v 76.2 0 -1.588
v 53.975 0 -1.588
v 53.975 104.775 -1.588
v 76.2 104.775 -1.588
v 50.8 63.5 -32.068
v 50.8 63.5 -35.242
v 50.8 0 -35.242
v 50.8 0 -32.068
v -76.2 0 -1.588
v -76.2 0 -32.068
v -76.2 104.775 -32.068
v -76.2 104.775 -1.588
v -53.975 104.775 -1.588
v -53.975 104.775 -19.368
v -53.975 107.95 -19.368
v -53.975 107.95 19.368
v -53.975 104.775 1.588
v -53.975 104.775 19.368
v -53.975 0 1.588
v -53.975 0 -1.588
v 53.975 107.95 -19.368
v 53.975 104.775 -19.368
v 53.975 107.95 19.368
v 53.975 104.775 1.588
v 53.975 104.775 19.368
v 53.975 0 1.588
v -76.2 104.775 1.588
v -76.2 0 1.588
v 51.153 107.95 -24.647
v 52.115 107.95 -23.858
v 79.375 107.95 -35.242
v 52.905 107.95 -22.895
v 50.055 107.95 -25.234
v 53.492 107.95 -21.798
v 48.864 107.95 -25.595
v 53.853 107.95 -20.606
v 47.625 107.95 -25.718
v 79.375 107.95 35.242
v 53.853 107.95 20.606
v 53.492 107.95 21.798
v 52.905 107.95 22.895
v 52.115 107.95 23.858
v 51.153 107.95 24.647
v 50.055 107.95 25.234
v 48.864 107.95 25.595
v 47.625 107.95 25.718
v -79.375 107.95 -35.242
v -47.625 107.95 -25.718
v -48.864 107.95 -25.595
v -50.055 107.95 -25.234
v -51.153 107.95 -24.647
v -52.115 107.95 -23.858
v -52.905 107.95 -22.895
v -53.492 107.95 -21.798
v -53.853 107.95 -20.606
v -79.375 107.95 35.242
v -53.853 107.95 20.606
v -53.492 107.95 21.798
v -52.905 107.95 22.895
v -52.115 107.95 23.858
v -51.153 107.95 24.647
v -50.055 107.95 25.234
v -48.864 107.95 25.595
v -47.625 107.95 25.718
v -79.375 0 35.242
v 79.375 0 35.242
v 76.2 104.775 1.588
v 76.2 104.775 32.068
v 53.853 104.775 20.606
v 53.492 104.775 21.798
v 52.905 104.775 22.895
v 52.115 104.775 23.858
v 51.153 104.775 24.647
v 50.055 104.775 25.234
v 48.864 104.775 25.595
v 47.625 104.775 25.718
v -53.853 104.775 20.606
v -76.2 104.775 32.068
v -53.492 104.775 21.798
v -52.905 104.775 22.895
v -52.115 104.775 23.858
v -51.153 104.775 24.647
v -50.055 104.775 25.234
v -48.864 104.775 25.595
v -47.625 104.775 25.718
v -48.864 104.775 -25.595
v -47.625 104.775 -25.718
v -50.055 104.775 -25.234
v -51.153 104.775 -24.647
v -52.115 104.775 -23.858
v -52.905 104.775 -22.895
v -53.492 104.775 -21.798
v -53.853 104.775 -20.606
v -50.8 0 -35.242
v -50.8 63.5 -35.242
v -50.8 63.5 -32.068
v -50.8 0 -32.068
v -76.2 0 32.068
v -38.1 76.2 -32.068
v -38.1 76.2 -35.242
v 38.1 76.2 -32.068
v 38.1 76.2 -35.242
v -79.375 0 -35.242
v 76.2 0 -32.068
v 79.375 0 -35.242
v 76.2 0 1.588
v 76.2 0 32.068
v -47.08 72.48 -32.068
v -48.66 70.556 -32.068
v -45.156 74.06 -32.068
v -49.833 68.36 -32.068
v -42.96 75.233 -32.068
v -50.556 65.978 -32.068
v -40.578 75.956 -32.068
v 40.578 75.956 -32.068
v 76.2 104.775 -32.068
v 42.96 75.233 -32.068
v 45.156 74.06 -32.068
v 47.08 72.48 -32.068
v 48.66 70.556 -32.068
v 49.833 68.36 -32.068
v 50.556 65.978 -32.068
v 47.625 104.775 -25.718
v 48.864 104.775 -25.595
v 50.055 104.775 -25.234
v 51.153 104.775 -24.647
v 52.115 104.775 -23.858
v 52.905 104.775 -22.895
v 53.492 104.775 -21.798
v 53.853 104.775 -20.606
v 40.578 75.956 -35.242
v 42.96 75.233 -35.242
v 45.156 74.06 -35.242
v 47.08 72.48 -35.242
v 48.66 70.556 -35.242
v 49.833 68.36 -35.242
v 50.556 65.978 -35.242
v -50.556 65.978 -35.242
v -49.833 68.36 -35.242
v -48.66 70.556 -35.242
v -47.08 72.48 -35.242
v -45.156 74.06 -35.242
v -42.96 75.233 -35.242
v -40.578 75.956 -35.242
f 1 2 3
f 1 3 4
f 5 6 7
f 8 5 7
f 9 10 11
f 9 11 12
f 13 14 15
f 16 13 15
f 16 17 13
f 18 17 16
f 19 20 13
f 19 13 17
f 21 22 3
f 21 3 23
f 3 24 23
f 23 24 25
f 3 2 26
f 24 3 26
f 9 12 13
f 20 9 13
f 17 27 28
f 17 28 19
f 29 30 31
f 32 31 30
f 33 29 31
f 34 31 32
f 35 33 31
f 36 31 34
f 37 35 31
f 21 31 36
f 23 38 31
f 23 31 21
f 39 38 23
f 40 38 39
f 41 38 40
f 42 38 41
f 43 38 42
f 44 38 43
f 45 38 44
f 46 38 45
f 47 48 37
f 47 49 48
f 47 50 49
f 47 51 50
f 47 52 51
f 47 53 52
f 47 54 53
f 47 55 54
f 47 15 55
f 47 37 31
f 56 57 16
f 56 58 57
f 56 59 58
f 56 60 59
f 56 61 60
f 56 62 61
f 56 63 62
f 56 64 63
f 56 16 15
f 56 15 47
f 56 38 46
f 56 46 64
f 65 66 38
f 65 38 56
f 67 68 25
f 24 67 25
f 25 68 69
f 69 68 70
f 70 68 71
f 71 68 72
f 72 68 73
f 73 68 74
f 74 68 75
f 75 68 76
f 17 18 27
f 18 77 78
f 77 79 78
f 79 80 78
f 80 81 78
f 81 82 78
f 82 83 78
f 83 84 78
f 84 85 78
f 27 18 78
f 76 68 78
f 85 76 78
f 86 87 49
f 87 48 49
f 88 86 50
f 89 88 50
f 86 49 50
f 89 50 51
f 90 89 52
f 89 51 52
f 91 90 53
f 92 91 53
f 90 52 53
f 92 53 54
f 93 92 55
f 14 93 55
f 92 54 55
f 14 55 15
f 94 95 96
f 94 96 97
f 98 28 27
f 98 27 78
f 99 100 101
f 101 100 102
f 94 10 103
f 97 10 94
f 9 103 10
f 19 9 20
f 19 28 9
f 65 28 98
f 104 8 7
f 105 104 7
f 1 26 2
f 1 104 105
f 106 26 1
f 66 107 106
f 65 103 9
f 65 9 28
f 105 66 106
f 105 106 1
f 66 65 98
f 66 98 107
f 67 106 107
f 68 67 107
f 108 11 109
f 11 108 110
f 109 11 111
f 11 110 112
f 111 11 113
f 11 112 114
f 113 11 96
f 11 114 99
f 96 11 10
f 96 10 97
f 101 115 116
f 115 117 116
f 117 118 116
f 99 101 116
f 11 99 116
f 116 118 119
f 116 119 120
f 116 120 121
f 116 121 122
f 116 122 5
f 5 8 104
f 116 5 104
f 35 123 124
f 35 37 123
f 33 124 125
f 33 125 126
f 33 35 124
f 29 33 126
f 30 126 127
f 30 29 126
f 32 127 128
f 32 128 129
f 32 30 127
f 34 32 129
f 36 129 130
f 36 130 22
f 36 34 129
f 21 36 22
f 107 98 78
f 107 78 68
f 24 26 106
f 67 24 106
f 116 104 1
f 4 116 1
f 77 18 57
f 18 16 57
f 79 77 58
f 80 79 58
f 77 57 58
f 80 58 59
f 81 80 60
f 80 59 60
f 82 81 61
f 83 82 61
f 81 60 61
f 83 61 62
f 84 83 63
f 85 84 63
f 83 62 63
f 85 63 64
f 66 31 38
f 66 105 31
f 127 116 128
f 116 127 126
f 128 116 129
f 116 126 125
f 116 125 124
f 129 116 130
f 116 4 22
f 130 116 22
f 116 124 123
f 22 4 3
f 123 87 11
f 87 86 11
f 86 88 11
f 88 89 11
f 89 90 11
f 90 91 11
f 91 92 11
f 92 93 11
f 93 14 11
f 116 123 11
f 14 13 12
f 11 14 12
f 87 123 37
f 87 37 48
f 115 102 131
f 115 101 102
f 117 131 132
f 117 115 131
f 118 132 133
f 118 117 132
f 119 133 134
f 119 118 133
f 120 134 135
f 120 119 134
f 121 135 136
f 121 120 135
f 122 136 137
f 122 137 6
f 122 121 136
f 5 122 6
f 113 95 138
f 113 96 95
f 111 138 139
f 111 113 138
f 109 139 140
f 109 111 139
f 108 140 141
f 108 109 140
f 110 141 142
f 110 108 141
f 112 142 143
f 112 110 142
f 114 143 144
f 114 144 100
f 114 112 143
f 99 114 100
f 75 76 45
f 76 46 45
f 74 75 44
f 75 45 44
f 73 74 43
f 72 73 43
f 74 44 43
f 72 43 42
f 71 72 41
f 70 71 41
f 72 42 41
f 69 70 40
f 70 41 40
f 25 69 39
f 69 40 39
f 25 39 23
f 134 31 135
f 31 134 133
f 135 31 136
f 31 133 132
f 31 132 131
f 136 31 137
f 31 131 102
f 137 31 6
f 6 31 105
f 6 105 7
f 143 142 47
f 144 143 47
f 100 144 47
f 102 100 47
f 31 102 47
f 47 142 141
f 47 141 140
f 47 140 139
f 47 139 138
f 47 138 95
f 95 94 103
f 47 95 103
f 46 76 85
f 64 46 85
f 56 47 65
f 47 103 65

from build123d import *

# Parameters (mm, degrees)
F0_W      = 158.75
F0_H      = 70.485
F1_DEPTH  = 104.775
F2_T      = -3.175
F3_W      = 152.4
F3_H      = 64.135
F4_DEPTH  = 3.175
F5_W      = 152.4
F5_H      = 3.175
F6_DEPTH  = 104.775
F7_W      = 107.95
F7_H      = 3.175
F8_DEPTH  = 104.775
F9_W      = 158.75
F9_H      = 70.485
F9_W_2    = 107.95
F9_H_2    = 51.435
F10_DEPTH = 3.175
F11_R     = 6.35
F12_W     = 101.6
F12_H     = 76.2
F13_DEPTH = 3.175
F14_R     = 12.7


with BuildPart() as f1:
    # F0 (on Front) → F1 (new body)
    with BuildSketch(Plane.XZ):
        Rectangle(F0_W, F0_H)
    extrude(amount=-F1_DEPTH)

    # F2
    f2_openings = [f1.faces().sort_by_distance(p)[0] for p in [
        (0, 0, 0),
    ]]
    offset(amount=F2_T, openings=f2_openings)

    # F3 (on face) → F4 (cut, through all)
    with BuildSketch(Plane.XZ.offset(-101.6)):
        Rectangle(F3_W, F3_H)
    extrude(amount=-F4_DEPTH, mode=Mode.SUBTRACT)

    # F5 (on face) → F6 (join)
    with BuildSketch(Plane.XZ):
        Rectangle(F5_W, F5_H)
    extrude(amount=-F6_DEPTH)

    # F7 (on face) → F8 (cut, through all)
    with BuildSketch(Plane.XZ):
        Rectangle(F7_W, F7_H)
    extrude(amount=-F8_DEPTH, mode=Mode.SUBTRACT)

    # F9 (on face) → F10 (join)
    with BuildSketch(Plane(origin=(0, 104.775, 0), x_dir=(-1, 0, 0), z_dir=(0, 1, 0))):
        Rectangle(F9_W, F9_H)
        Rectangle(F9_W_2, F9_H_2, mode=Mode.SUBTRACT)
    extrude(amount=F10_DEPTH)

    # F11
    f11_edges = [f1.edges().sort_by_distance(p)[0] for p in [
        (53.975, 106.3625, 25.7175),
        (-53.975, 106.3625, 25.7175),
        (-53.975, 106.3625, -25.7175),
        (53.975, 106.3625, -25.7175),
    ]]
    fillet(f11_edges, radius=F11_R)

    # F12 (on face) → F13 (cut, through all)
    with BuildSketch(Plane(origin=(0, 0, -35.2425), x_dir=(1, 0, 0), z_dir=(0, 0, -1))):
        with Locations((0, -38.1)):
            Rectangle(F12_W, F12_H)
    extrude(amount=-F13_DEPTH, mode=Mode.SUBTRACT)

    # F14
    f14_edges = [f1.edges().sort_by_distance(p)[0] for p in [
        (-50.8, 76.2, -33.655),
        (50.8, 76.2, -33.655),
    ]]
    fillet(f14_edges, radius=F14_R)


solid = f1.part
